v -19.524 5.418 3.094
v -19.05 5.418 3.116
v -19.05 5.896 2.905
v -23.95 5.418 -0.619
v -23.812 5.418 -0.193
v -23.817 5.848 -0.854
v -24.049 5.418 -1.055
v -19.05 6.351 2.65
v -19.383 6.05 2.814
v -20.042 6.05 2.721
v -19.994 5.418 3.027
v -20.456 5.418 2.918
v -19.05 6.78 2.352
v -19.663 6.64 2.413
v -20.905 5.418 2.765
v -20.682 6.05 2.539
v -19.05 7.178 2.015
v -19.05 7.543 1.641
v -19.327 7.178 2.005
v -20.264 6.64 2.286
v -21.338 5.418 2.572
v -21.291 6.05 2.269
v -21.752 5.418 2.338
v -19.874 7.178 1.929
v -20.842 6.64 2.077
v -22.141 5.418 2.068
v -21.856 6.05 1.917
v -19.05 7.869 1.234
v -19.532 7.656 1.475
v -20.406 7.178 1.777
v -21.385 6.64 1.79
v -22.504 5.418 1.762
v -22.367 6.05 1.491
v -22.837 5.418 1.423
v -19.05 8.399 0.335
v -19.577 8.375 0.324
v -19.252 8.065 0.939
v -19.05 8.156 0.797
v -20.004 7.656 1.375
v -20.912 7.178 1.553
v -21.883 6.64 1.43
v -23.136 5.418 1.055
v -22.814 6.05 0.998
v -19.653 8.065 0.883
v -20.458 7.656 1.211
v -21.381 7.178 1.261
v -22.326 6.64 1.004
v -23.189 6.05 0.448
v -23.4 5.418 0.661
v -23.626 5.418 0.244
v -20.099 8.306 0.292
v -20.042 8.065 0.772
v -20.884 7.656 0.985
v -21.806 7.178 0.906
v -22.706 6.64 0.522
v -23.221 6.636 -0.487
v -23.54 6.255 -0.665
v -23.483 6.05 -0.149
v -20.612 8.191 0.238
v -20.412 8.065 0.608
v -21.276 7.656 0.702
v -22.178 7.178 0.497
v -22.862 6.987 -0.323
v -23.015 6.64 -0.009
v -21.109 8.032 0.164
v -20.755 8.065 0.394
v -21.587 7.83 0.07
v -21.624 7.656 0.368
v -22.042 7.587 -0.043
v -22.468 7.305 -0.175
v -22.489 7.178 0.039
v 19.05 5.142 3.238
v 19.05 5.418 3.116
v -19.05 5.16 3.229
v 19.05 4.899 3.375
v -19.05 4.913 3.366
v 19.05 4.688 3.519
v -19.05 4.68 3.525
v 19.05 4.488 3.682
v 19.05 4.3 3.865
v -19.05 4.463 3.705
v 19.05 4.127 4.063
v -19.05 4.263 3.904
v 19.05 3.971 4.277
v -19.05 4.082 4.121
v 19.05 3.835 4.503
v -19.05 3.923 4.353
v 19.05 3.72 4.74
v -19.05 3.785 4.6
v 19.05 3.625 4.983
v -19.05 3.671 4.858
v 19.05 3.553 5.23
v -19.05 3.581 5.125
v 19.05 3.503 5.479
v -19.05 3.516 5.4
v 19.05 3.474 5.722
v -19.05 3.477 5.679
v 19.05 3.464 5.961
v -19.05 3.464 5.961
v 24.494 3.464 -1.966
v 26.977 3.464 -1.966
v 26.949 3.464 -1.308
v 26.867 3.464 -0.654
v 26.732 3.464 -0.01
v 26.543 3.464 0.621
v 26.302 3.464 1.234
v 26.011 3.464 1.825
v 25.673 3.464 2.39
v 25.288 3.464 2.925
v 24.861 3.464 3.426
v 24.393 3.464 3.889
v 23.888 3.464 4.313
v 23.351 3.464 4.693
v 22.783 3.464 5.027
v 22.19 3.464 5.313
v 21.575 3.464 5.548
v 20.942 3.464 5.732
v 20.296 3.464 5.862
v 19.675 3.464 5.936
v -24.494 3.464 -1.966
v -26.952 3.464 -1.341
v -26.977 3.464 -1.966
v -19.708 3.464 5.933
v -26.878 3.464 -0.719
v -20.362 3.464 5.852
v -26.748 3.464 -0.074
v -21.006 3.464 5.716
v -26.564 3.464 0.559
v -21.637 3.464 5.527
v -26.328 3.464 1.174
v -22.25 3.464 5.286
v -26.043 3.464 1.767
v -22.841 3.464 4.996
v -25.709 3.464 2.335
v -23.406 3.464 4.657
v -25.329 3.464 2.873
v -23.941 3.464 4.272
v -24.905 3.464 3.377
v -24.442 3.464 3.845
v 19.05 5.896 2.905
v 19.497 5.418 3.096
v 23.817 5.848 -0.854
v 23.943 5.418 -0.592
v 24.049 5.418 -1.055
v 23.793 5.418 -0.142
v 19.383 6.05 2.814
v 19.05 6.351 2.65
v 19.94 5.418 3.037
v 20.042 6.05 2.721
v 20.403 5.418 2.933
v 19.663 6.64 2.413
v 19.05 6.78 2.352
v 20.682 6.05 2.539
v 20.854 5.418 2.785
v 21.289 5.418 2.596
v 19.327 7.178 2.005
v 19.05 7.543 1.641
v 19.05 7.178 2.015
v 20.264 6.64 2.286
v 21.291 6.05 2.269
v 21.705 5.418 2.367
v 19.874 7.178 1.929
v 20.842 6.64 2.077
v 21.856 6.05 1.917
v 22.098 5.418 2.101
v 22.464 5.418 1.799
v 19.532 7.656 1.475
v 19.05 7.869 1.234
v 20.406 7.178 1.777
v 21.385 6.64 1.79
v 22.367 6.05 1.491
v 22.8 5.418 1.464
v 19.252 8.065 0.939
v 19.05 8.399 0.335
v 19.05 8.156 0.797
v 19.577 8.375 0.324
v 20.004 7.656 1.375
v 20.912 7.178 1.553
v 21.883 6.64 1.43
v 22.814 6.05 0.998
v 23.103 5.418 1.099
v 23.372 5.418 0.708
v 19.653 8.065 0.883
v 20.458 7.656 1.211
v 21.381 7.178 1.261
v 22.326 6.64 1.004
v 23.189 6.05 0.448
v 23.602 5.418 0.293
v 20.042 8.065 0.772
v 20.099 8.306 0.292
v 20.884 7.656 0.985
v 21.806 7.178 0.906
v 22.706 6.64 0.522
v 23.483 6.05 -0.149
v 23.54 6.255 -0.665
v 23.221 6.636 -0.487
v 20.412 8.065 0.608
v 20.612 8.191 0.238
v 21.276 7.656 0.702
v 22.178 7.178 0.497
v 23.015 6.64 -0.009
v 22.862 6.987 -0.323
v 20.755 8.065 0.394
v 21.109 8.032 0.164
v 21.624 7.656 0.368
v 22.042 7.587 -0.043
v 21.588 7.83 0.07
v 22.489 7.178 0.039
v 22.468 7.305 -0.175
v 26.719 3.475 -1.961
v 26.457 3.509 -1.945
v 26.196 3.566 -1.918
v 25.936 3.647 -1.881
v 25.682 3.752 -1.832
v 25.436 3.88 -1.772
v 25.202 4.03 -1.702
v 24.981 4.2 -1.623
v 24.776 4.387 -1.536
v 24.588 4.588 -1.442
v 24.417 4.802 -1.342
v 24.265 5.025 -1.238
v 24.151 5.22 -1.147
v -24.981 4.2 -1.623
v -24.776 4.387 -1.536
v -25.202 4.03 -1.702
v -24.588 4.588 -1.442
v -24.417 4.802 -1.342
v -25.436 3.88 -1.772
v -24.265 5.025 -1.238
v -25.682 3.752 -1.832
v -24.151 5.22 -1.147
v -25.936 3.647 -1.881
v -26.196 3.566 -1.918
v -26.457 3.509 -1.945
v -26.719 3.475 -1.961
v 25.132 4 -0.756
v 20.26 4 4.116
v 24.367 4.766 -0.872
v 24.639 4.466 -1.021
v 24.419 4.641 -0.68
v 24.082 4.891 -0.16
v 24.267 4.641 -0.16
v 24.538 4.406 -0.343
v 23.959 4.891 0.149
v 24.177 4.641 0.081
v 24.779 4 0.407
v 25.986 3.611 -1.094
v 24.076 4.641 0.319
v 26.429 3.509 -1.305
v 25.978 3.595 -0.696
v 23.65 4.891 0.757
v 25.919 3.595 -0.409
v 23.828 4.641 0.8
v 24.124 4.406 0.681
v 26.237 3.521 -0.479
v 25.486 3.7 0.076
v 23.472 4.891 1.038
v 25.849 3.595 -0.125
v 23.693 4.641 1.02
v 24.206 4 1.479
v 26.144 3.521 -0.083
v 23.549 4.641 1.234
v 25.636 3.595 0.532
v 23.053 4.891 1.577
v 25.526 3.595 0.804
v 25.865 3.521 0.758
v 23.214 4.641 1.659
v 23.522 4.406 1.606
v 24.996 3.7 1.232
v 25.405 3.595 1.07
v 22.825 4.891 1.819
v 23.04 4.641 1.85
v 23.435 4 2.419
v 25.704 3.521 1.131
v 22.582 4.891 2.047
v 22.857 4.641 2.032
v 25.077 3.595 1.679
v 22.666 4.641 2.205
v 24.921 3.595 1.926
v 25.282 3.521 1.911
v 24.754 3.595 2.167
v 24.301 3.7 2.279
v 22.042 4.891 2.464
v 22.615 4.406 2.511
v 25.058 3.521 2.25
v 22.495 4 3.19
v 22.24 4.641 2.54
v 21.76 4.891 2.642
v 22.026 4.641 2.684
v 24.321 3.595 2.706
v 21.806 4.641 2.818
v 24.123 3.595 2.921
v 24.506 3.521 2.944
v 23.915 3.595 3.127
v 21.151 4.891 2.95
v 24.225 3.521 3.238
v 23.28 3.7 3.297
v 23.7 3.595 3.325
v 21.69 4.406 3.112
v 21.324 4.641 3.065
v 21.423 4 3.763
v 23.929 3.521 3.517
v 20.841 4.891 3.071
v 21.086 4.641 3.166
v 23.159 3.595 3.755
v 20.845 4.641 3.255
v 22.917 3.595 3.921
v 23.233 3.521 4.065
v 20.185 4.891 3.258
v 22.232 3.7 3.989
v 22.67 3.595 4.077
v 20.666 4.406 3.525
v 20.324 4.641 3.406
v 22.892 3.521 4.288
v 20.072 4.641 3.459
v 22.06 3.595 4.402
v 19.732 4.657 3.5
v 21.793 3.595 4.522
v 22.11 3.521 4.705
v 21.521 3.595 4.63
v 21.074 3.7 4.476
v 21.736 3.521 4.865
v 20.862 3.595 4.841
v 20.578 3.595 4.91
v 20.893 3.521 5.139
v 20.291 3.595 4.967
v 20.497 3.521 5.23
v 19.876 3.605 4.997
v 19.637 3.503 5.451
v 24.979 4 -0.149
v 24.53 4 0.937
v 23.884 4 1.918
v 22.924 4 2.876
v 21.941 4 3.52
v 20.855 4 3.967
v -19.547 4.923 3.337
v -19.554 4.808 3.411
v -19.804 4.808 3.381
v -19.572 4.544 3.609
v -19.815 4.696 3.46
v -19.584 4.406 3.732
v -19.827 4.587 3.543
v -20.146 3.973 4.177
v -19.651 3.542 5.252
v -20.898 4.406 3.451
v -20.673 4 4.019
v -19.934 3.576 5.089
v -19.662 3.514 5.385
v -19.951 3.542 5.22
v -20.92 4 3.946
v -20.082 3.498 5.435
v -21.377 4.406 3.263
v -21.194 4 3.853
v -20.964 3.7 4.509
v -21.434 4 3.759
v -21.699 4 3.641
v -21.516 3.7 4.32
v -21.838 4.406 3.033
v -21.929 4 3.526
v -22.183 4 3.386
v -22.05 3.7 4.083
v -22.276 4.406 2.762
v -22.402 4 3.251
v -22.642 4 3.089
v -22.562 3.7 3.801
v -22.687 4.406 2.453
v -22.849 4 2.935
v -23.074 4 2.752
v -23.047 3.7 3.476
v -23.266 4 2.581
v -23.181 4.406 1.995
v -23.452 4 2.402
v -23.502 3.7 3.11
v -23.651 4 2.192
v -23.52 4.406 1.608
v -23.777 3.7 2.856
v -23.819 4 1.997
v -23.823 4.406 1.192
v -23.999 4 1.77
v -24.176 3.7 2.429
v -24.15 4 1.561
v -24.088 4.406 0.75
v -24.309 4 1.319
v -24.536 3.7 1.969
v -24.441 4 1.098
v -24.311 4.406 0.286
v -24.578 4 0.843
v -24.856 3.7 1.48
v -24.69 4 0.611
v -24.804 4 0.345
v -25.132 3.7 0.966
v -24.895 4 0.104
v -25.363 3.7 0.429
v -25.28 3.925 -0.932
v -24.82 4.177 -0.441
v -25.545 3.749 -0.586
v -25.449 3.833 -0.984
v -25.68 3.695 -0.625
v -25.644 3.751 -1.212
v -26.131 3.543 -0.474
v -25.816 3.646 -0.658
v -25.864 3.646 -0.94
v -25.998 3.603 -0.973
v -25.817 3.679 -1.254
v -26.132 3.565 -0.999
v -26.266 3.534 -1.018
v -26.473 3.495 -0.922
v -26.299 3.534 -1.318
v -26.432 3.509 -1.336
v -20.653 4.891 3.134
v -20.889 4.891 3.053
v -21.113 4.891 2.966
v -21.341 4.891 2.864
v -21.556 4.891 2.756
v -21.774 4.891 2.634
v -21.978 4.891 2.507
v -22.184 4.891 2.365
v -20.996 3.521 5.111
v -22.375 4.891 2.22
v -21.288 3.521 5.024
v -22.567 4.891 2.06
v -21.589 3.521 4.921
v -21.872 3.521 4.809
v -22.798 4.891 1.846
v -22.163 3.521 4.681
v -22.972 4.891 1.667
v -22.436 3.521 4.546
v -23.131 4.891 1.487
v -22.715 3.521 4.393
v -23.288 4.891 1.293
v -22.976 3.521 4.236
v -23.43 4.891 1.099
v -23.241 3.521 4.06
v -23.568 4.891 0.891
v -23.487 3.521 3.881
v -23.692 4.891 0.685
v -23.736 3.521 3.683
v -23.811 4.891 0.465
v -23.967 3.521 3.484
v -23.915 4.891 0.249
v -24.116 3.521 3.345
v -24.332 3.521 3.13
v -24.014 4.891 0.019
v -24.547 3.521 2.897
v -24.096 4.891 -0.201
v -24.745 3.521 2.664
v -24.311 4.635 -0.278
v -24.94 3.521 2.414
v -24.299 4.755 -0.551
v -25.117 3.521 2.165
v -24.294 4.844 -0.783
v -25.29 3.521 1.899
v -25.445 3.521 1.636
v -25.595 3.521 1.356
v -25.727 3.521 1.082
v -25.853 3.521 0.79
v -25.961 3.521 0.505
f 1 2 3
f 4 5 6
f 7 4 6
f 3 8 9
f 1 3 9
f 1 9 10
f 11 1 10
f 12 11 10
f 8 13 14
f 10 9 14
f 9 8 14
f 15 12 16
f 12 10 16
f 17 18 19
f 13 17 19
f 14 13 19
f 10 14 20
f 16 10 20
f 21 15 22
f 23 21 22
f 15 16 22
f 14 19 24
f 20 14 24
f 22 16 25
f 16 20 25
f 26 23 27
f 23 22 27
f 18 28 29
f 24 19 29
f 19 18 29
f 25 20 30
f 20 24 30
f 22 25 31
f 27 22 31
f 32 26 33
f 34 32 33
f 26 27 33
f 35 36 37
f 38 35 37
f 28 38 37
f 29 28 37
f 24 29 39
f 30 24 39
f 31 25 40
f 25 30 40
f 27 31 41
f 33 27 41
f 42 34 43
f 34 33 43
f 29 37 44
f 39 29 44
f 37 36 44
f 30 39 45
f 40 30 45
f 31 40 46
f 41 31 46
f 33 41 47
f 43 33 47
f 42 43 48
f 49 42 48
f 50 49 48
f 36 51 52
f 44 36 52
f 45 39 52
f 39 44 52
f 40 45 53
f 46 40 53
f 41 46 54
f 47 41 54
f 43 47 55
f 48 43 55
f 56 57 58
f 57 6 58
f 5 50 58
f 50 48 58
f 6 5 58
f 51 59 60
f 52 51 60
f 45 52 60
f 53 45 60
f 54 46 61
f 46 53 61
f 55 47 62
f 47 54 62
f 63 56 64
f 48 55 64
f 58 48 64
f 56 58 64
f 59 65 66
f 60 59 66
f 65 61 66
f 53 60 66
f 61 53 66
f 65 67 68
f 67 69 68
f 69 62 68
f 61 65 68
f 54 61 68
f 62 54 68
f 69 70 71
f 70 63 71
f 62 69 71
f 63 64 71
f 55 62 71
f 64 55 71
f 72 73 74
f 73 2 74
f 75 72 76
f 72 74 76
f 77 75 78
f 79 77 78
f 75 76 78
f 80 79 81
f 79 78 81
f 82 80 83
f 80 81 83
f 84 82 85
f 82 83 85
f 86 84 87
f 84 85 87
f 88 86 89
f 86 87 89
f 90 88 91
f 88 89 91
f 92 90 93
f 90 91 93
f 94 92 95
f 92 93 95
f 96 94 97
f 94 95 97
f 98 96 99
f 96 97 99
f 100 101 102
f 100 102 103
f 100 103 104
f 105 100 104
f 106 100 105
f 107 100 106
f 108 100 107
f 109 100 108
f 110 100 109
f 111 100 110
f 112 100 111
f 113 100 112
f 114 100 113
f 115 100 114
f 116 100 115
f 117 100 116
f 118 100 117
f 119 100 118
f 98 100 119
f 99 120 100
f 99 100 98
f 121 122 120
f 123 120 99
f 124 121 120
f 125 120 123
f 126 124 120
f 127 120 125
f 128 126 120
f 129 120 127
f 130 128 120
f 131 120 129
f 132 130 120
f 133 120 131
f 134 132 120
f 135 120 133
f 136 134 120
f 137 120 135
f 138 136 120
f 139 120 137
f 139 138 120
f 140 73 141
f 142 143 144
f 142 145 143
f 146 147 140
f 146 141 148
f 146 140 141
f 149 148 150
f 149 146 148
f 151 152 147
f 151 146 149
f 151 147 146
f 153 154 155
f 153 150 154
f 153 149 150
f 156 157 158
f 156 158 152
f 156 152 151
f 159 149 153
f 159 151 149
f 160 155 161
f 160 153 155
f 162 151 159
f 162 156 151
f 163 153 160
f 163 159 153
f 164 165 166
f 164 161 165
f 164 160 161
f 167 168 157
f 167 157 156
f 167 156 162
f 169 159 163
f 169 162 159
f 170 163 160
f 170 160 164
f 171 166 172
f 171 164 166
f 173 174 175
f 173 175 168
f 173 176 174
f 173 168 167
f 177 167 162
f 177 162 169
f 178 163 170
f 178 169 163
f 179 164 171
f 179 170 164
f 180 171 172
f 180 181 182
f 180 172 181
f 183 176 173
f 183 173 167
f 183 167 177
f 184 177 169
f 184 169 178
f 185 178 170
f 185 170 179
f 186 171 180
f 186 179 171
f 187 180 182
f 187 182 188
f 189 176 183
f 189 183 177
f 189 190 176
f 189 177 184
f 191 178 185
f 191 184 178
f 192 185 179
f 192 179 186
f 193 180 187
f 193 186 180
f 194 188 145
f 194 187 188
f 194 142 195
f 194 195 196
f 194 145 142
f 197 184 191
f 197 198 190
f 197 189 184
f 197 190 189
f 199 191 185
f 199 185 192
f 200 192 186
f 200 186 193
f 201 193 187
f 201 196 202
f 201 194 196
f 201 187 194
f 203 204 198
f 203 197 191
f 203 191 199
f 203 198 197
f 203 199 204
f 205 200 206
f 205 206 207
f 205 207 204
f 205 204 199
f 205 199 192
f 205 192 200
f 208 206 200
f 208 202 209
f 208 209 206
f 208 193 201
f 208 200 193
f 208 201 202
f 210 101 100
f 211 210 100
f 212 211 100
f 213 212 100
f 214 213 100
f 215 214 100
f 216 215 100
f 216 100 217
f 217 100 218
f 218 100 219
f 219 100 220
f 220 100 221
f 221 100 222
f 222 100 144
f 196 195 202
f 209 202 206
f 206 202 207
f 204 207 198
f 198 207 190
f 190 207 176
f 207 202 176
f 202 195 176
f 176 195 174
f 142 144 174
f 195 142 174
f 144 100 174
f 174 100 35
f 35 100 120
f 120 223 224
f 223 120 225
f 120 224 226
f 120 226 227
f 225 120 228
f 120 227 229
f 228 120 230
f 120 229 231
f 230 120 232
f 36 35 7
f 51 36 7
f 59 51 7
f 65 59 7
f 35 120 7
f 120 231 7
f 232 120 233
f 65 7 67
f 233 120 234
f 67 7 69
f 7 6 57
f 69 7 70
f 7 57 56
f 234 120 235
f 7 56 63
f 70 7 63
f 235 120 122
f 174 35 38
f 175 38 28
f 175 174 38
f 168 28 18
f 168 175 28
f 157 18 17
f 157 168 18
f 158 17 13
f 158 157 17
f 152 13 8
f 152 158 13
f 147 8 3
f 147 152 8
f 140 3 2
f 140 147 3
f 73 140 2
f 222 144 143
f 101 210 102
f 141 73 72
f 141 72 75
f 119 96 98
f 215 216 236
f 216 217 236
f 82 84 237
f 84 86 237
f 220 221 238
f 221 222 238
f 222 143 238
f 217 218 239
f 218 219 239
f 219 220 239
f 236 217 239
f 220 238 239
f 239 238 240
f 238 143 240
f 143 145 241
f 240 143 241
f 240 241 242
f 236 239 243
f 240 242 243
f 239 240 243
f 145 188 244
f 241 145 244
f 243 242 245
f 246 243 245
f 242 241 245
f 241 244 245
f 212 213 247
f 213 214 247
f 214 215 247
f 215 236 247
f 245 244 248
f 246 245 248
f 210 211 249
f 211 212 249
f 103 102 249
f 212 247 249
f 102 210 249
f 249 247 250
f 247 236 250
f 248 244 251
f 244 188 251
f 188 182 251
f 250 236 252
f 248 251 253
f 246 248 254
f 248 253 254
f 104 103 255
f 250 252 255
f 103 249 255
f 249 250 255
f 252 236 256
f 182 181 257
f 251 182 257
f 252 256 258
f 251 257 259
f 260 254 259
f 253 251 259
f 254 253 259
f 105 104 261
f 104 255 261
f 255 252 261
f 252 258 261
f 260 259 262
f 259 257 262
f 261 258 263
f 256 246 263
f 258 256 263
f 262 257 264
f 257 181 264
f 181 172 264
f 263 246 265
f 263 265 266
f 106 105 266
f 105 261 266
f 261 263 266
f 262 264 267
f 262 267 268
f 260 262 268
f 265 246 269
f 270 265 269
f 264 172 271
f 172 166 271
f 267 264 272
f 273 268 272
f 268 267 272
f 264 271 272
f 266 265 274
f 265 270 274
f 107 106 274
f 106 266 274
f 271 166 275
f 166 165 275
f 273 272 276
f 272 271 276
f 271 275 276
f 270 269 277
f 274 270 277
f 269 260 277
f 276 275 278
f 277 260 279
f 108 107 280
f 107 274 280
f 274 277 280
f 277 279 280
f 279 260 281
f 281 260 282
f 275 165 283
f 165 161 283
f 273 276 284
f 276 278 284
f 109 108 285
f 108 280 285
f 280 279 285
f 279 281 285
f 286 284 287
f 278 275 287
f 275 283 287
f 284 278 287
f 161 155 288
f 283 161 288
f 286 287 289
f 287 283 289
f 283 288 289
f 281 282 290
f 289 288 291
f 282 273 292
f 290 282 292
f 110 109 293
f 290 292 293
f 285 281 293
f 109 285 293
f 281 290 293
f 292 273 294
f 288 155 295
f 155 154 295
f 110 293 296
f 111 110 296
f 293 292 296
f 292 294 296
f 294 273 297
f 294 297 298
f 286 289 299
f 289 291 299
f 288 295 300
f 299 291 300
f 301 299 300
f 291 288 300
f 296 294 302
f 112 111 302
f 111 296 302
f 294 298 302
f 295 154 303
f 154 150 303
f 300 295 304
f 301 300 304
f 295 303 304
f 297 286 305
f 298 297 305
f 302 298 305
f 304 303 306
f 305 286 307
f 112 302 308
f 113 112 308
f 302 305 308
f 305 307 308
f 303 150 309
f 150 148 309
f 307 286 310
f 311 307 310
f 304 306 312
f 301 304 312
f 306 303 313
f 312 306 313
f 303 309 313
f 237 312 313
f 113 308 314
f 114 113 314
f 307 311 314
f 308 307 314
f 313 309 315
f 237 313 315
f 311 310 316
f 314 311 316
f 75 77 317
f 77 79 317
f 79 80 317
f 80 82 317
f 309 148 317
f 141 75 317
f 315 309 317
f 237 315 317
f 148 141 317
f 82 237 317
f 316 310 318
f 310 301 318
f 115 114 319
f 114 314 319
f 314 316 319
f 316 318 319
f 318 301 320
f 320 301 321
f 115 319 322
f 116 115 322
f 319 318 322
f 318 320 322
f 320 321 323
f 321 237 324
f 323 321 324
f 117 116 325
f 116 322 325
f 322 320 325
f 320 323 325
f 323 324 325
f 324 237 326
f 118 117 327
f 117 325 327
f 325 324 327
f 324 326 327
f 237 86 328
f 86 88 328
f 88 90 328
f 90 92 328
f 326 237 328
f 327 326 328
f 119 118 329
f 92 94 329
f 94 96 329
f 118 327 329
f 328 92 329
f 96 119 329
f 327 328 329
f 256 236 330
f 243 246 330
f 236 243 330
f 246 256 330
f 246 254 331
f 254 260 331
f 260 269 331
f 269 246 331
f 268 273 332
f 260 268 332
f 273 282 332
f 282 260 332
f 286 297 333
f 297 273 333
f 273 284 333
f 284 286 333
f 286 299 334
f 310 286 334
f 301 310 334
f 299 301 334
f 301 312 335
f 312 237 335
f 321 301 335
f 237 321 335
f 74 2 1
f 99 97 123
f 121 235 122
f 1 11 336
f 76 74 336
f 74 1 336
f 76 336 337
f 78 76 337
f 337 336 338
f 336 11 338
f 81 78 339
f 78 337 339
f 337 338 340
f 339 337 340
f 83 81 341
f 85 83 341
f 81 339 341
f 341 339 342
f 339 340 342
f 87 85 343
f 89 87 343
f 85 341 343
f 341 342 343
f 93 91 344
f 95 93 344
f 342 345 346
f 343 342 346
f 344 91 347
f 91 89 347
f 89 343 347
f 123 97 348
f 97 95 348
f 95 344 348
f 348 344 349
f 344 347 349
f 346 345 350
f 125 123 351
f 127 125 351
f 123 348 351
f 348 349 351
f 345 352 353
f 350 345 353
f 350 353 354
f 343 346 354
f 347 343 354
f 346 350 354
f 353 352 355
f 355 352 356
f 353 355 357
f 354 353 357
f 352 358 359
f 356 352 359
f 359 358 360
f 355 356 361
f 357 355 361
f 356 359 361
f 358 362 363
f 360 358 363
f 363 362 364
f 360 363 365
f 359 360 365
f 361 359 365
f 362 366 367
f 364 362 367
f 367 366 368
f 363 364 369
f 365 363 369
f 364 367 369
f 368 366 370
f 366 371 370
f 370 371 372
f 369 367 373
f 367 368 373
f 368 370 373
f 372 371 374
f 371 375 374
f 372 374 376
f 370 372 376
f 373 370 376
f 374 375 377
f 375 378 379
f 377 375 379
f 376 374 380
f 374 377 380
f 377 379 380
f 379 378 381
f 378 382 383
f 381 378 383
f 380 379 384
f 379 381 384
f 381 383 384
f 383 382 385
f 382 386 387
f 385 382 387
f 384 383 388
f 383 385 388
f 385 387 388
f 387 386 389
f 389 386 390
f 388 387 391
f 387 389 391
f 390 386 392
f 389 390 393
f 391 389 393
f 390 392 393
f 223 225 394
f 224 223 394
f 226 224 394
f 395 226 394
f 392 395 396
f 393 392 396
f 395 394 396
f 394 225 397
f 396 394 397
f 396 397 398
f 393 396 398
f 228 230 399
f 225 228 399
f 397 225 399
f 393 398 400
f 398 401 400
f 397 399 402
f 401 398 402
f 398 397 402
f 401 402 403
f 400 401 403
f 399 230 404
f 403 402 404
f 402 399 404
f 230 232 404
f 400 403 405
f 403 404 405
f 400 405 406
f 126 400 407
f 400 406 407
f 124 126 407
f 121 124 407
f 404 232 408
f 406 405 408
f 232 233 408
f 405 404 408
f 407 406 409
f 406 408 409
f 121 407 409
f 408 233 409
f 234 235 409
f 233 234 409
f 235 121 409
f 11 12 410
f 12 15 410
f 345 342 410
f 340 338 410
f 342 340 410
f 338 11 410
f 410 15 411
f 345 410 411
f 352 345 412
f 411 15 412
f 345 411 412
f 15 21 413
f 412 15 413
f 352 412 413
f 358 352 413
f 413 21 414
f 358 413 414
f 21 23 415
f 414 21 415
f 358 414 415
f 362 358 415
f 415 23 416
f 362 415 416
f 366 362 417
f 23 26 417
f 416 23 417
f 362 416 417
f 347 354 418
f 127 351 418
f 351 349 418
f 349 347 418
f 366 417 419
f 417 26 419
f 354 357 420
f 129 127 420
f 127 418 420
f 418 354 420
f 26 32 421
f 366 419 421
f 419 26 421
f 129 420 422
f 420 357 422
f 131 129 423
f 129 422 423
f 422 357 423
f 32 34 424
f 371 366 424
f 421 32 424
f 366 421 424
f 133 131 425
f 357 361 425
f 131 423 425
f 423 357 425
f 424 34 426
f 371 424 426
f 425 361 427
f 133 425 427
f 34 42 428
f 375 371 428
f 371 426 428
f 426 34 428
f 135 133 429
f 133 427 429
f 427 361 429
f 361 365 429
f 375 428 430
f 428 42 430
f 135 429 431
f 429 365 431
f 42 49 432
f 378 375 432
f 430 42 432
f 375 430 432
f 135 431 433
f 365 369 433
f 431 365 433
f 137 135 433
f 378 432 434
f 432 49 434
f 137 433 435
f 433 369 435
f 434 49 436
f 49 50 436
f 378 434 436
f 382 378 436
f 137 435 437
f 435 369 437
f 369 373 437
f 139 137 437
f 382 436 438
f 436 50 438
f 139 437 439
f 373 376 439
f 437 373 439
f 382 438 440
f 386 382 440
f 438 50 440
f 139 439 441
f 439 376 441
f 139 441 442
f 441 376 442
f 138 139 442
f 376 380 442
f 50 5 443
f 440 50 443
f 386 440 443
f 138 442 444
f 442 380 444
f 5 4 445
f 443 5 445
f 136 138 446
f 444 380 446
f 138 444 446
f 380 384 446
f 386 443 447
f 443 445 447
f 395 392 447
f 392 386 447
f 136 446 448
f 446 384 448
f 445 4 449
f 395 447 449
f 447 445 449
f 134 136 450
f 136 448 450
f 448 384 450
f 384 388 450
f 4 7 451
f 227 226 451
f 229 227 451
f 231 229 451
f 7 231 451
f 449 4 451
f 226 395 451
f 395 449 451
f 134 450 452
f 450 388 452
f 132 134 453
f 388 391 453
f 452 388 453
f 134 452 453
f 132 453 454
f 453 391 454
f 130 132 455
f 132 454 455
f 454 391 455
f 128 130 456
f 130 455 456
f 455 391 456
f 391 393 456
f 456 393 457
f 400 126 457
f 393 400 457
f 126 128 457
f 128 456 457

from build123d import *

# Parameters (mm, degrees)
SKETCH1_W               = 50.8
SKETCH1_H               = 3.464243611
BASE_EXTRUDE_DEPTH      = 50.8
BOSS_EXTRUDE1_DEPTH     = 19.05
BOSS_REVOLVE1_ANGLE     = 90
FILLET1_R               = 3.048
CUT_EXTRUDE2_DEPTH      = 58.490562181
CUT_EXTRUDE2_DEPTH_BACK = 58.490562181
SKETCH5_W               = 50.8
SKETCH5_H               = 3.464243611
CUT_EXTRUDE1_DEPTH      = 106.06310615


with BuildPart() as part:
    # Sketch1 → Base-Extrude (new, symmetric)
    with BuildSketch(Plane(origin=(0, 0, 0), x_dir=(0, 0, -1), z_dir=(1, 0, 0))):
        with Locations((0, 1.732121806)):
            Rectangle(SKETCH1_W, SKETCH1_H)
    extrude(amount=BASE_EXTRUDE_DEPTH, both=True)

    # Sketch3 → Boss-Extrude1 (add, symmetric)
    with BuildSketch(Plane(origin=(0, 4.664955708, 2.581196581), x_dir=(0, 0, 1), z_dir=(1, 0, 0))):
        with BuildLine():
            Line((-4.547008547, 1.200712097), (-4.547008547, -4.243732347))
            ThreePointArc((-4.547008547, -4.243732347), (-0.697204961, -2.649091489), (0.897435897, 1.200712097))
            Line((0.897435897, 1.200712097), (-4.547008547, 1.200712097))
        make_face()
    extrude(amount=BOSS_EXTRUDE1_DEPTH, both=True)

    # Sketch4 → Boss-Revolve1 (revolve)
    with BuildSketch(Plane.ZY.offset(19.05)):
        with BuildLine():
            Line((-1.965811966, 3.464243611), (3.478632479, 3.464243611))
            ThreePointArc((3.478632479, 3.464243611), (1.883991621, 7.314047197), (-1.965811966, 8.908688055))
            Line((-1.965811966, 8.908688055), (-1.965811966, 3.464243611))
        make_face()
    boss_revolve1 = revolve(axis=Axis((-19.05, 3.464243611, -1.965811966), (0, -1, 0)), revolution_arc=BOSS_REVOLVE1_ANGLE)

    # Mirror1: Boss-Revolve1 across plane
    add(boss_revolve1.mirror(Plane(origin=(0, 0, 0), x_dir=(0, 0, 1), z_dir=(1, 0, 0))))

    # Fillet1
    fillet1_edges = [part.edges().sort_by_distance(p)[0] for p in [
        (0, 3.464243611, 3.478632479),
        (-22.899803586, 3.464243611, 1.883991621),
        (22.899803586, 3.464243611, 1.883991621),
    ]]
    fillet(fillet1_edges, radius=FILLET1_R)

    # Sketch7 → Cut-Extrude2 (cut, two sides: drawn at the far end of the back side and taken through both)
    with BuildSketch(Plane(origin=(0, 0, 0), x_dir=(0, 0, -1), z_dir=(1, 0, 0)).offset(-CUT_EXTRUDE2_DEPTH_BACK)):
        with BuildLine():
            Line((1.965811966, 3.464243611), (-0.335109681, 8.398586007))
            ThreePointArc((-0.335109681, 8.398586007), (0.787418512, 8.779632983), (1.965811966, 8.908688055))
            Line((1.965811966, 8.908688055), (1.965811966, 3.464243611))
        make_face()
    extrude(amount=CUT_EXTRUDE2_DEPTH + CUT_EXTRUDE2_DEPTH_BACK, mode=Mode.SUBTRACT)

    # Sketch5 → Cut-Extrude1 (cut, through all)
    with BuildSketch(Plane.ZY.offset(50.8)):
        with Locations((0, 1.732121806)):
            Rectangle(SKETCH5_W, SKETCH5_H)
    extrude(amount=-CUT_EXTRUDE1_DEPTH, mode=Mode.SUBTRACT)


solid = part.part
